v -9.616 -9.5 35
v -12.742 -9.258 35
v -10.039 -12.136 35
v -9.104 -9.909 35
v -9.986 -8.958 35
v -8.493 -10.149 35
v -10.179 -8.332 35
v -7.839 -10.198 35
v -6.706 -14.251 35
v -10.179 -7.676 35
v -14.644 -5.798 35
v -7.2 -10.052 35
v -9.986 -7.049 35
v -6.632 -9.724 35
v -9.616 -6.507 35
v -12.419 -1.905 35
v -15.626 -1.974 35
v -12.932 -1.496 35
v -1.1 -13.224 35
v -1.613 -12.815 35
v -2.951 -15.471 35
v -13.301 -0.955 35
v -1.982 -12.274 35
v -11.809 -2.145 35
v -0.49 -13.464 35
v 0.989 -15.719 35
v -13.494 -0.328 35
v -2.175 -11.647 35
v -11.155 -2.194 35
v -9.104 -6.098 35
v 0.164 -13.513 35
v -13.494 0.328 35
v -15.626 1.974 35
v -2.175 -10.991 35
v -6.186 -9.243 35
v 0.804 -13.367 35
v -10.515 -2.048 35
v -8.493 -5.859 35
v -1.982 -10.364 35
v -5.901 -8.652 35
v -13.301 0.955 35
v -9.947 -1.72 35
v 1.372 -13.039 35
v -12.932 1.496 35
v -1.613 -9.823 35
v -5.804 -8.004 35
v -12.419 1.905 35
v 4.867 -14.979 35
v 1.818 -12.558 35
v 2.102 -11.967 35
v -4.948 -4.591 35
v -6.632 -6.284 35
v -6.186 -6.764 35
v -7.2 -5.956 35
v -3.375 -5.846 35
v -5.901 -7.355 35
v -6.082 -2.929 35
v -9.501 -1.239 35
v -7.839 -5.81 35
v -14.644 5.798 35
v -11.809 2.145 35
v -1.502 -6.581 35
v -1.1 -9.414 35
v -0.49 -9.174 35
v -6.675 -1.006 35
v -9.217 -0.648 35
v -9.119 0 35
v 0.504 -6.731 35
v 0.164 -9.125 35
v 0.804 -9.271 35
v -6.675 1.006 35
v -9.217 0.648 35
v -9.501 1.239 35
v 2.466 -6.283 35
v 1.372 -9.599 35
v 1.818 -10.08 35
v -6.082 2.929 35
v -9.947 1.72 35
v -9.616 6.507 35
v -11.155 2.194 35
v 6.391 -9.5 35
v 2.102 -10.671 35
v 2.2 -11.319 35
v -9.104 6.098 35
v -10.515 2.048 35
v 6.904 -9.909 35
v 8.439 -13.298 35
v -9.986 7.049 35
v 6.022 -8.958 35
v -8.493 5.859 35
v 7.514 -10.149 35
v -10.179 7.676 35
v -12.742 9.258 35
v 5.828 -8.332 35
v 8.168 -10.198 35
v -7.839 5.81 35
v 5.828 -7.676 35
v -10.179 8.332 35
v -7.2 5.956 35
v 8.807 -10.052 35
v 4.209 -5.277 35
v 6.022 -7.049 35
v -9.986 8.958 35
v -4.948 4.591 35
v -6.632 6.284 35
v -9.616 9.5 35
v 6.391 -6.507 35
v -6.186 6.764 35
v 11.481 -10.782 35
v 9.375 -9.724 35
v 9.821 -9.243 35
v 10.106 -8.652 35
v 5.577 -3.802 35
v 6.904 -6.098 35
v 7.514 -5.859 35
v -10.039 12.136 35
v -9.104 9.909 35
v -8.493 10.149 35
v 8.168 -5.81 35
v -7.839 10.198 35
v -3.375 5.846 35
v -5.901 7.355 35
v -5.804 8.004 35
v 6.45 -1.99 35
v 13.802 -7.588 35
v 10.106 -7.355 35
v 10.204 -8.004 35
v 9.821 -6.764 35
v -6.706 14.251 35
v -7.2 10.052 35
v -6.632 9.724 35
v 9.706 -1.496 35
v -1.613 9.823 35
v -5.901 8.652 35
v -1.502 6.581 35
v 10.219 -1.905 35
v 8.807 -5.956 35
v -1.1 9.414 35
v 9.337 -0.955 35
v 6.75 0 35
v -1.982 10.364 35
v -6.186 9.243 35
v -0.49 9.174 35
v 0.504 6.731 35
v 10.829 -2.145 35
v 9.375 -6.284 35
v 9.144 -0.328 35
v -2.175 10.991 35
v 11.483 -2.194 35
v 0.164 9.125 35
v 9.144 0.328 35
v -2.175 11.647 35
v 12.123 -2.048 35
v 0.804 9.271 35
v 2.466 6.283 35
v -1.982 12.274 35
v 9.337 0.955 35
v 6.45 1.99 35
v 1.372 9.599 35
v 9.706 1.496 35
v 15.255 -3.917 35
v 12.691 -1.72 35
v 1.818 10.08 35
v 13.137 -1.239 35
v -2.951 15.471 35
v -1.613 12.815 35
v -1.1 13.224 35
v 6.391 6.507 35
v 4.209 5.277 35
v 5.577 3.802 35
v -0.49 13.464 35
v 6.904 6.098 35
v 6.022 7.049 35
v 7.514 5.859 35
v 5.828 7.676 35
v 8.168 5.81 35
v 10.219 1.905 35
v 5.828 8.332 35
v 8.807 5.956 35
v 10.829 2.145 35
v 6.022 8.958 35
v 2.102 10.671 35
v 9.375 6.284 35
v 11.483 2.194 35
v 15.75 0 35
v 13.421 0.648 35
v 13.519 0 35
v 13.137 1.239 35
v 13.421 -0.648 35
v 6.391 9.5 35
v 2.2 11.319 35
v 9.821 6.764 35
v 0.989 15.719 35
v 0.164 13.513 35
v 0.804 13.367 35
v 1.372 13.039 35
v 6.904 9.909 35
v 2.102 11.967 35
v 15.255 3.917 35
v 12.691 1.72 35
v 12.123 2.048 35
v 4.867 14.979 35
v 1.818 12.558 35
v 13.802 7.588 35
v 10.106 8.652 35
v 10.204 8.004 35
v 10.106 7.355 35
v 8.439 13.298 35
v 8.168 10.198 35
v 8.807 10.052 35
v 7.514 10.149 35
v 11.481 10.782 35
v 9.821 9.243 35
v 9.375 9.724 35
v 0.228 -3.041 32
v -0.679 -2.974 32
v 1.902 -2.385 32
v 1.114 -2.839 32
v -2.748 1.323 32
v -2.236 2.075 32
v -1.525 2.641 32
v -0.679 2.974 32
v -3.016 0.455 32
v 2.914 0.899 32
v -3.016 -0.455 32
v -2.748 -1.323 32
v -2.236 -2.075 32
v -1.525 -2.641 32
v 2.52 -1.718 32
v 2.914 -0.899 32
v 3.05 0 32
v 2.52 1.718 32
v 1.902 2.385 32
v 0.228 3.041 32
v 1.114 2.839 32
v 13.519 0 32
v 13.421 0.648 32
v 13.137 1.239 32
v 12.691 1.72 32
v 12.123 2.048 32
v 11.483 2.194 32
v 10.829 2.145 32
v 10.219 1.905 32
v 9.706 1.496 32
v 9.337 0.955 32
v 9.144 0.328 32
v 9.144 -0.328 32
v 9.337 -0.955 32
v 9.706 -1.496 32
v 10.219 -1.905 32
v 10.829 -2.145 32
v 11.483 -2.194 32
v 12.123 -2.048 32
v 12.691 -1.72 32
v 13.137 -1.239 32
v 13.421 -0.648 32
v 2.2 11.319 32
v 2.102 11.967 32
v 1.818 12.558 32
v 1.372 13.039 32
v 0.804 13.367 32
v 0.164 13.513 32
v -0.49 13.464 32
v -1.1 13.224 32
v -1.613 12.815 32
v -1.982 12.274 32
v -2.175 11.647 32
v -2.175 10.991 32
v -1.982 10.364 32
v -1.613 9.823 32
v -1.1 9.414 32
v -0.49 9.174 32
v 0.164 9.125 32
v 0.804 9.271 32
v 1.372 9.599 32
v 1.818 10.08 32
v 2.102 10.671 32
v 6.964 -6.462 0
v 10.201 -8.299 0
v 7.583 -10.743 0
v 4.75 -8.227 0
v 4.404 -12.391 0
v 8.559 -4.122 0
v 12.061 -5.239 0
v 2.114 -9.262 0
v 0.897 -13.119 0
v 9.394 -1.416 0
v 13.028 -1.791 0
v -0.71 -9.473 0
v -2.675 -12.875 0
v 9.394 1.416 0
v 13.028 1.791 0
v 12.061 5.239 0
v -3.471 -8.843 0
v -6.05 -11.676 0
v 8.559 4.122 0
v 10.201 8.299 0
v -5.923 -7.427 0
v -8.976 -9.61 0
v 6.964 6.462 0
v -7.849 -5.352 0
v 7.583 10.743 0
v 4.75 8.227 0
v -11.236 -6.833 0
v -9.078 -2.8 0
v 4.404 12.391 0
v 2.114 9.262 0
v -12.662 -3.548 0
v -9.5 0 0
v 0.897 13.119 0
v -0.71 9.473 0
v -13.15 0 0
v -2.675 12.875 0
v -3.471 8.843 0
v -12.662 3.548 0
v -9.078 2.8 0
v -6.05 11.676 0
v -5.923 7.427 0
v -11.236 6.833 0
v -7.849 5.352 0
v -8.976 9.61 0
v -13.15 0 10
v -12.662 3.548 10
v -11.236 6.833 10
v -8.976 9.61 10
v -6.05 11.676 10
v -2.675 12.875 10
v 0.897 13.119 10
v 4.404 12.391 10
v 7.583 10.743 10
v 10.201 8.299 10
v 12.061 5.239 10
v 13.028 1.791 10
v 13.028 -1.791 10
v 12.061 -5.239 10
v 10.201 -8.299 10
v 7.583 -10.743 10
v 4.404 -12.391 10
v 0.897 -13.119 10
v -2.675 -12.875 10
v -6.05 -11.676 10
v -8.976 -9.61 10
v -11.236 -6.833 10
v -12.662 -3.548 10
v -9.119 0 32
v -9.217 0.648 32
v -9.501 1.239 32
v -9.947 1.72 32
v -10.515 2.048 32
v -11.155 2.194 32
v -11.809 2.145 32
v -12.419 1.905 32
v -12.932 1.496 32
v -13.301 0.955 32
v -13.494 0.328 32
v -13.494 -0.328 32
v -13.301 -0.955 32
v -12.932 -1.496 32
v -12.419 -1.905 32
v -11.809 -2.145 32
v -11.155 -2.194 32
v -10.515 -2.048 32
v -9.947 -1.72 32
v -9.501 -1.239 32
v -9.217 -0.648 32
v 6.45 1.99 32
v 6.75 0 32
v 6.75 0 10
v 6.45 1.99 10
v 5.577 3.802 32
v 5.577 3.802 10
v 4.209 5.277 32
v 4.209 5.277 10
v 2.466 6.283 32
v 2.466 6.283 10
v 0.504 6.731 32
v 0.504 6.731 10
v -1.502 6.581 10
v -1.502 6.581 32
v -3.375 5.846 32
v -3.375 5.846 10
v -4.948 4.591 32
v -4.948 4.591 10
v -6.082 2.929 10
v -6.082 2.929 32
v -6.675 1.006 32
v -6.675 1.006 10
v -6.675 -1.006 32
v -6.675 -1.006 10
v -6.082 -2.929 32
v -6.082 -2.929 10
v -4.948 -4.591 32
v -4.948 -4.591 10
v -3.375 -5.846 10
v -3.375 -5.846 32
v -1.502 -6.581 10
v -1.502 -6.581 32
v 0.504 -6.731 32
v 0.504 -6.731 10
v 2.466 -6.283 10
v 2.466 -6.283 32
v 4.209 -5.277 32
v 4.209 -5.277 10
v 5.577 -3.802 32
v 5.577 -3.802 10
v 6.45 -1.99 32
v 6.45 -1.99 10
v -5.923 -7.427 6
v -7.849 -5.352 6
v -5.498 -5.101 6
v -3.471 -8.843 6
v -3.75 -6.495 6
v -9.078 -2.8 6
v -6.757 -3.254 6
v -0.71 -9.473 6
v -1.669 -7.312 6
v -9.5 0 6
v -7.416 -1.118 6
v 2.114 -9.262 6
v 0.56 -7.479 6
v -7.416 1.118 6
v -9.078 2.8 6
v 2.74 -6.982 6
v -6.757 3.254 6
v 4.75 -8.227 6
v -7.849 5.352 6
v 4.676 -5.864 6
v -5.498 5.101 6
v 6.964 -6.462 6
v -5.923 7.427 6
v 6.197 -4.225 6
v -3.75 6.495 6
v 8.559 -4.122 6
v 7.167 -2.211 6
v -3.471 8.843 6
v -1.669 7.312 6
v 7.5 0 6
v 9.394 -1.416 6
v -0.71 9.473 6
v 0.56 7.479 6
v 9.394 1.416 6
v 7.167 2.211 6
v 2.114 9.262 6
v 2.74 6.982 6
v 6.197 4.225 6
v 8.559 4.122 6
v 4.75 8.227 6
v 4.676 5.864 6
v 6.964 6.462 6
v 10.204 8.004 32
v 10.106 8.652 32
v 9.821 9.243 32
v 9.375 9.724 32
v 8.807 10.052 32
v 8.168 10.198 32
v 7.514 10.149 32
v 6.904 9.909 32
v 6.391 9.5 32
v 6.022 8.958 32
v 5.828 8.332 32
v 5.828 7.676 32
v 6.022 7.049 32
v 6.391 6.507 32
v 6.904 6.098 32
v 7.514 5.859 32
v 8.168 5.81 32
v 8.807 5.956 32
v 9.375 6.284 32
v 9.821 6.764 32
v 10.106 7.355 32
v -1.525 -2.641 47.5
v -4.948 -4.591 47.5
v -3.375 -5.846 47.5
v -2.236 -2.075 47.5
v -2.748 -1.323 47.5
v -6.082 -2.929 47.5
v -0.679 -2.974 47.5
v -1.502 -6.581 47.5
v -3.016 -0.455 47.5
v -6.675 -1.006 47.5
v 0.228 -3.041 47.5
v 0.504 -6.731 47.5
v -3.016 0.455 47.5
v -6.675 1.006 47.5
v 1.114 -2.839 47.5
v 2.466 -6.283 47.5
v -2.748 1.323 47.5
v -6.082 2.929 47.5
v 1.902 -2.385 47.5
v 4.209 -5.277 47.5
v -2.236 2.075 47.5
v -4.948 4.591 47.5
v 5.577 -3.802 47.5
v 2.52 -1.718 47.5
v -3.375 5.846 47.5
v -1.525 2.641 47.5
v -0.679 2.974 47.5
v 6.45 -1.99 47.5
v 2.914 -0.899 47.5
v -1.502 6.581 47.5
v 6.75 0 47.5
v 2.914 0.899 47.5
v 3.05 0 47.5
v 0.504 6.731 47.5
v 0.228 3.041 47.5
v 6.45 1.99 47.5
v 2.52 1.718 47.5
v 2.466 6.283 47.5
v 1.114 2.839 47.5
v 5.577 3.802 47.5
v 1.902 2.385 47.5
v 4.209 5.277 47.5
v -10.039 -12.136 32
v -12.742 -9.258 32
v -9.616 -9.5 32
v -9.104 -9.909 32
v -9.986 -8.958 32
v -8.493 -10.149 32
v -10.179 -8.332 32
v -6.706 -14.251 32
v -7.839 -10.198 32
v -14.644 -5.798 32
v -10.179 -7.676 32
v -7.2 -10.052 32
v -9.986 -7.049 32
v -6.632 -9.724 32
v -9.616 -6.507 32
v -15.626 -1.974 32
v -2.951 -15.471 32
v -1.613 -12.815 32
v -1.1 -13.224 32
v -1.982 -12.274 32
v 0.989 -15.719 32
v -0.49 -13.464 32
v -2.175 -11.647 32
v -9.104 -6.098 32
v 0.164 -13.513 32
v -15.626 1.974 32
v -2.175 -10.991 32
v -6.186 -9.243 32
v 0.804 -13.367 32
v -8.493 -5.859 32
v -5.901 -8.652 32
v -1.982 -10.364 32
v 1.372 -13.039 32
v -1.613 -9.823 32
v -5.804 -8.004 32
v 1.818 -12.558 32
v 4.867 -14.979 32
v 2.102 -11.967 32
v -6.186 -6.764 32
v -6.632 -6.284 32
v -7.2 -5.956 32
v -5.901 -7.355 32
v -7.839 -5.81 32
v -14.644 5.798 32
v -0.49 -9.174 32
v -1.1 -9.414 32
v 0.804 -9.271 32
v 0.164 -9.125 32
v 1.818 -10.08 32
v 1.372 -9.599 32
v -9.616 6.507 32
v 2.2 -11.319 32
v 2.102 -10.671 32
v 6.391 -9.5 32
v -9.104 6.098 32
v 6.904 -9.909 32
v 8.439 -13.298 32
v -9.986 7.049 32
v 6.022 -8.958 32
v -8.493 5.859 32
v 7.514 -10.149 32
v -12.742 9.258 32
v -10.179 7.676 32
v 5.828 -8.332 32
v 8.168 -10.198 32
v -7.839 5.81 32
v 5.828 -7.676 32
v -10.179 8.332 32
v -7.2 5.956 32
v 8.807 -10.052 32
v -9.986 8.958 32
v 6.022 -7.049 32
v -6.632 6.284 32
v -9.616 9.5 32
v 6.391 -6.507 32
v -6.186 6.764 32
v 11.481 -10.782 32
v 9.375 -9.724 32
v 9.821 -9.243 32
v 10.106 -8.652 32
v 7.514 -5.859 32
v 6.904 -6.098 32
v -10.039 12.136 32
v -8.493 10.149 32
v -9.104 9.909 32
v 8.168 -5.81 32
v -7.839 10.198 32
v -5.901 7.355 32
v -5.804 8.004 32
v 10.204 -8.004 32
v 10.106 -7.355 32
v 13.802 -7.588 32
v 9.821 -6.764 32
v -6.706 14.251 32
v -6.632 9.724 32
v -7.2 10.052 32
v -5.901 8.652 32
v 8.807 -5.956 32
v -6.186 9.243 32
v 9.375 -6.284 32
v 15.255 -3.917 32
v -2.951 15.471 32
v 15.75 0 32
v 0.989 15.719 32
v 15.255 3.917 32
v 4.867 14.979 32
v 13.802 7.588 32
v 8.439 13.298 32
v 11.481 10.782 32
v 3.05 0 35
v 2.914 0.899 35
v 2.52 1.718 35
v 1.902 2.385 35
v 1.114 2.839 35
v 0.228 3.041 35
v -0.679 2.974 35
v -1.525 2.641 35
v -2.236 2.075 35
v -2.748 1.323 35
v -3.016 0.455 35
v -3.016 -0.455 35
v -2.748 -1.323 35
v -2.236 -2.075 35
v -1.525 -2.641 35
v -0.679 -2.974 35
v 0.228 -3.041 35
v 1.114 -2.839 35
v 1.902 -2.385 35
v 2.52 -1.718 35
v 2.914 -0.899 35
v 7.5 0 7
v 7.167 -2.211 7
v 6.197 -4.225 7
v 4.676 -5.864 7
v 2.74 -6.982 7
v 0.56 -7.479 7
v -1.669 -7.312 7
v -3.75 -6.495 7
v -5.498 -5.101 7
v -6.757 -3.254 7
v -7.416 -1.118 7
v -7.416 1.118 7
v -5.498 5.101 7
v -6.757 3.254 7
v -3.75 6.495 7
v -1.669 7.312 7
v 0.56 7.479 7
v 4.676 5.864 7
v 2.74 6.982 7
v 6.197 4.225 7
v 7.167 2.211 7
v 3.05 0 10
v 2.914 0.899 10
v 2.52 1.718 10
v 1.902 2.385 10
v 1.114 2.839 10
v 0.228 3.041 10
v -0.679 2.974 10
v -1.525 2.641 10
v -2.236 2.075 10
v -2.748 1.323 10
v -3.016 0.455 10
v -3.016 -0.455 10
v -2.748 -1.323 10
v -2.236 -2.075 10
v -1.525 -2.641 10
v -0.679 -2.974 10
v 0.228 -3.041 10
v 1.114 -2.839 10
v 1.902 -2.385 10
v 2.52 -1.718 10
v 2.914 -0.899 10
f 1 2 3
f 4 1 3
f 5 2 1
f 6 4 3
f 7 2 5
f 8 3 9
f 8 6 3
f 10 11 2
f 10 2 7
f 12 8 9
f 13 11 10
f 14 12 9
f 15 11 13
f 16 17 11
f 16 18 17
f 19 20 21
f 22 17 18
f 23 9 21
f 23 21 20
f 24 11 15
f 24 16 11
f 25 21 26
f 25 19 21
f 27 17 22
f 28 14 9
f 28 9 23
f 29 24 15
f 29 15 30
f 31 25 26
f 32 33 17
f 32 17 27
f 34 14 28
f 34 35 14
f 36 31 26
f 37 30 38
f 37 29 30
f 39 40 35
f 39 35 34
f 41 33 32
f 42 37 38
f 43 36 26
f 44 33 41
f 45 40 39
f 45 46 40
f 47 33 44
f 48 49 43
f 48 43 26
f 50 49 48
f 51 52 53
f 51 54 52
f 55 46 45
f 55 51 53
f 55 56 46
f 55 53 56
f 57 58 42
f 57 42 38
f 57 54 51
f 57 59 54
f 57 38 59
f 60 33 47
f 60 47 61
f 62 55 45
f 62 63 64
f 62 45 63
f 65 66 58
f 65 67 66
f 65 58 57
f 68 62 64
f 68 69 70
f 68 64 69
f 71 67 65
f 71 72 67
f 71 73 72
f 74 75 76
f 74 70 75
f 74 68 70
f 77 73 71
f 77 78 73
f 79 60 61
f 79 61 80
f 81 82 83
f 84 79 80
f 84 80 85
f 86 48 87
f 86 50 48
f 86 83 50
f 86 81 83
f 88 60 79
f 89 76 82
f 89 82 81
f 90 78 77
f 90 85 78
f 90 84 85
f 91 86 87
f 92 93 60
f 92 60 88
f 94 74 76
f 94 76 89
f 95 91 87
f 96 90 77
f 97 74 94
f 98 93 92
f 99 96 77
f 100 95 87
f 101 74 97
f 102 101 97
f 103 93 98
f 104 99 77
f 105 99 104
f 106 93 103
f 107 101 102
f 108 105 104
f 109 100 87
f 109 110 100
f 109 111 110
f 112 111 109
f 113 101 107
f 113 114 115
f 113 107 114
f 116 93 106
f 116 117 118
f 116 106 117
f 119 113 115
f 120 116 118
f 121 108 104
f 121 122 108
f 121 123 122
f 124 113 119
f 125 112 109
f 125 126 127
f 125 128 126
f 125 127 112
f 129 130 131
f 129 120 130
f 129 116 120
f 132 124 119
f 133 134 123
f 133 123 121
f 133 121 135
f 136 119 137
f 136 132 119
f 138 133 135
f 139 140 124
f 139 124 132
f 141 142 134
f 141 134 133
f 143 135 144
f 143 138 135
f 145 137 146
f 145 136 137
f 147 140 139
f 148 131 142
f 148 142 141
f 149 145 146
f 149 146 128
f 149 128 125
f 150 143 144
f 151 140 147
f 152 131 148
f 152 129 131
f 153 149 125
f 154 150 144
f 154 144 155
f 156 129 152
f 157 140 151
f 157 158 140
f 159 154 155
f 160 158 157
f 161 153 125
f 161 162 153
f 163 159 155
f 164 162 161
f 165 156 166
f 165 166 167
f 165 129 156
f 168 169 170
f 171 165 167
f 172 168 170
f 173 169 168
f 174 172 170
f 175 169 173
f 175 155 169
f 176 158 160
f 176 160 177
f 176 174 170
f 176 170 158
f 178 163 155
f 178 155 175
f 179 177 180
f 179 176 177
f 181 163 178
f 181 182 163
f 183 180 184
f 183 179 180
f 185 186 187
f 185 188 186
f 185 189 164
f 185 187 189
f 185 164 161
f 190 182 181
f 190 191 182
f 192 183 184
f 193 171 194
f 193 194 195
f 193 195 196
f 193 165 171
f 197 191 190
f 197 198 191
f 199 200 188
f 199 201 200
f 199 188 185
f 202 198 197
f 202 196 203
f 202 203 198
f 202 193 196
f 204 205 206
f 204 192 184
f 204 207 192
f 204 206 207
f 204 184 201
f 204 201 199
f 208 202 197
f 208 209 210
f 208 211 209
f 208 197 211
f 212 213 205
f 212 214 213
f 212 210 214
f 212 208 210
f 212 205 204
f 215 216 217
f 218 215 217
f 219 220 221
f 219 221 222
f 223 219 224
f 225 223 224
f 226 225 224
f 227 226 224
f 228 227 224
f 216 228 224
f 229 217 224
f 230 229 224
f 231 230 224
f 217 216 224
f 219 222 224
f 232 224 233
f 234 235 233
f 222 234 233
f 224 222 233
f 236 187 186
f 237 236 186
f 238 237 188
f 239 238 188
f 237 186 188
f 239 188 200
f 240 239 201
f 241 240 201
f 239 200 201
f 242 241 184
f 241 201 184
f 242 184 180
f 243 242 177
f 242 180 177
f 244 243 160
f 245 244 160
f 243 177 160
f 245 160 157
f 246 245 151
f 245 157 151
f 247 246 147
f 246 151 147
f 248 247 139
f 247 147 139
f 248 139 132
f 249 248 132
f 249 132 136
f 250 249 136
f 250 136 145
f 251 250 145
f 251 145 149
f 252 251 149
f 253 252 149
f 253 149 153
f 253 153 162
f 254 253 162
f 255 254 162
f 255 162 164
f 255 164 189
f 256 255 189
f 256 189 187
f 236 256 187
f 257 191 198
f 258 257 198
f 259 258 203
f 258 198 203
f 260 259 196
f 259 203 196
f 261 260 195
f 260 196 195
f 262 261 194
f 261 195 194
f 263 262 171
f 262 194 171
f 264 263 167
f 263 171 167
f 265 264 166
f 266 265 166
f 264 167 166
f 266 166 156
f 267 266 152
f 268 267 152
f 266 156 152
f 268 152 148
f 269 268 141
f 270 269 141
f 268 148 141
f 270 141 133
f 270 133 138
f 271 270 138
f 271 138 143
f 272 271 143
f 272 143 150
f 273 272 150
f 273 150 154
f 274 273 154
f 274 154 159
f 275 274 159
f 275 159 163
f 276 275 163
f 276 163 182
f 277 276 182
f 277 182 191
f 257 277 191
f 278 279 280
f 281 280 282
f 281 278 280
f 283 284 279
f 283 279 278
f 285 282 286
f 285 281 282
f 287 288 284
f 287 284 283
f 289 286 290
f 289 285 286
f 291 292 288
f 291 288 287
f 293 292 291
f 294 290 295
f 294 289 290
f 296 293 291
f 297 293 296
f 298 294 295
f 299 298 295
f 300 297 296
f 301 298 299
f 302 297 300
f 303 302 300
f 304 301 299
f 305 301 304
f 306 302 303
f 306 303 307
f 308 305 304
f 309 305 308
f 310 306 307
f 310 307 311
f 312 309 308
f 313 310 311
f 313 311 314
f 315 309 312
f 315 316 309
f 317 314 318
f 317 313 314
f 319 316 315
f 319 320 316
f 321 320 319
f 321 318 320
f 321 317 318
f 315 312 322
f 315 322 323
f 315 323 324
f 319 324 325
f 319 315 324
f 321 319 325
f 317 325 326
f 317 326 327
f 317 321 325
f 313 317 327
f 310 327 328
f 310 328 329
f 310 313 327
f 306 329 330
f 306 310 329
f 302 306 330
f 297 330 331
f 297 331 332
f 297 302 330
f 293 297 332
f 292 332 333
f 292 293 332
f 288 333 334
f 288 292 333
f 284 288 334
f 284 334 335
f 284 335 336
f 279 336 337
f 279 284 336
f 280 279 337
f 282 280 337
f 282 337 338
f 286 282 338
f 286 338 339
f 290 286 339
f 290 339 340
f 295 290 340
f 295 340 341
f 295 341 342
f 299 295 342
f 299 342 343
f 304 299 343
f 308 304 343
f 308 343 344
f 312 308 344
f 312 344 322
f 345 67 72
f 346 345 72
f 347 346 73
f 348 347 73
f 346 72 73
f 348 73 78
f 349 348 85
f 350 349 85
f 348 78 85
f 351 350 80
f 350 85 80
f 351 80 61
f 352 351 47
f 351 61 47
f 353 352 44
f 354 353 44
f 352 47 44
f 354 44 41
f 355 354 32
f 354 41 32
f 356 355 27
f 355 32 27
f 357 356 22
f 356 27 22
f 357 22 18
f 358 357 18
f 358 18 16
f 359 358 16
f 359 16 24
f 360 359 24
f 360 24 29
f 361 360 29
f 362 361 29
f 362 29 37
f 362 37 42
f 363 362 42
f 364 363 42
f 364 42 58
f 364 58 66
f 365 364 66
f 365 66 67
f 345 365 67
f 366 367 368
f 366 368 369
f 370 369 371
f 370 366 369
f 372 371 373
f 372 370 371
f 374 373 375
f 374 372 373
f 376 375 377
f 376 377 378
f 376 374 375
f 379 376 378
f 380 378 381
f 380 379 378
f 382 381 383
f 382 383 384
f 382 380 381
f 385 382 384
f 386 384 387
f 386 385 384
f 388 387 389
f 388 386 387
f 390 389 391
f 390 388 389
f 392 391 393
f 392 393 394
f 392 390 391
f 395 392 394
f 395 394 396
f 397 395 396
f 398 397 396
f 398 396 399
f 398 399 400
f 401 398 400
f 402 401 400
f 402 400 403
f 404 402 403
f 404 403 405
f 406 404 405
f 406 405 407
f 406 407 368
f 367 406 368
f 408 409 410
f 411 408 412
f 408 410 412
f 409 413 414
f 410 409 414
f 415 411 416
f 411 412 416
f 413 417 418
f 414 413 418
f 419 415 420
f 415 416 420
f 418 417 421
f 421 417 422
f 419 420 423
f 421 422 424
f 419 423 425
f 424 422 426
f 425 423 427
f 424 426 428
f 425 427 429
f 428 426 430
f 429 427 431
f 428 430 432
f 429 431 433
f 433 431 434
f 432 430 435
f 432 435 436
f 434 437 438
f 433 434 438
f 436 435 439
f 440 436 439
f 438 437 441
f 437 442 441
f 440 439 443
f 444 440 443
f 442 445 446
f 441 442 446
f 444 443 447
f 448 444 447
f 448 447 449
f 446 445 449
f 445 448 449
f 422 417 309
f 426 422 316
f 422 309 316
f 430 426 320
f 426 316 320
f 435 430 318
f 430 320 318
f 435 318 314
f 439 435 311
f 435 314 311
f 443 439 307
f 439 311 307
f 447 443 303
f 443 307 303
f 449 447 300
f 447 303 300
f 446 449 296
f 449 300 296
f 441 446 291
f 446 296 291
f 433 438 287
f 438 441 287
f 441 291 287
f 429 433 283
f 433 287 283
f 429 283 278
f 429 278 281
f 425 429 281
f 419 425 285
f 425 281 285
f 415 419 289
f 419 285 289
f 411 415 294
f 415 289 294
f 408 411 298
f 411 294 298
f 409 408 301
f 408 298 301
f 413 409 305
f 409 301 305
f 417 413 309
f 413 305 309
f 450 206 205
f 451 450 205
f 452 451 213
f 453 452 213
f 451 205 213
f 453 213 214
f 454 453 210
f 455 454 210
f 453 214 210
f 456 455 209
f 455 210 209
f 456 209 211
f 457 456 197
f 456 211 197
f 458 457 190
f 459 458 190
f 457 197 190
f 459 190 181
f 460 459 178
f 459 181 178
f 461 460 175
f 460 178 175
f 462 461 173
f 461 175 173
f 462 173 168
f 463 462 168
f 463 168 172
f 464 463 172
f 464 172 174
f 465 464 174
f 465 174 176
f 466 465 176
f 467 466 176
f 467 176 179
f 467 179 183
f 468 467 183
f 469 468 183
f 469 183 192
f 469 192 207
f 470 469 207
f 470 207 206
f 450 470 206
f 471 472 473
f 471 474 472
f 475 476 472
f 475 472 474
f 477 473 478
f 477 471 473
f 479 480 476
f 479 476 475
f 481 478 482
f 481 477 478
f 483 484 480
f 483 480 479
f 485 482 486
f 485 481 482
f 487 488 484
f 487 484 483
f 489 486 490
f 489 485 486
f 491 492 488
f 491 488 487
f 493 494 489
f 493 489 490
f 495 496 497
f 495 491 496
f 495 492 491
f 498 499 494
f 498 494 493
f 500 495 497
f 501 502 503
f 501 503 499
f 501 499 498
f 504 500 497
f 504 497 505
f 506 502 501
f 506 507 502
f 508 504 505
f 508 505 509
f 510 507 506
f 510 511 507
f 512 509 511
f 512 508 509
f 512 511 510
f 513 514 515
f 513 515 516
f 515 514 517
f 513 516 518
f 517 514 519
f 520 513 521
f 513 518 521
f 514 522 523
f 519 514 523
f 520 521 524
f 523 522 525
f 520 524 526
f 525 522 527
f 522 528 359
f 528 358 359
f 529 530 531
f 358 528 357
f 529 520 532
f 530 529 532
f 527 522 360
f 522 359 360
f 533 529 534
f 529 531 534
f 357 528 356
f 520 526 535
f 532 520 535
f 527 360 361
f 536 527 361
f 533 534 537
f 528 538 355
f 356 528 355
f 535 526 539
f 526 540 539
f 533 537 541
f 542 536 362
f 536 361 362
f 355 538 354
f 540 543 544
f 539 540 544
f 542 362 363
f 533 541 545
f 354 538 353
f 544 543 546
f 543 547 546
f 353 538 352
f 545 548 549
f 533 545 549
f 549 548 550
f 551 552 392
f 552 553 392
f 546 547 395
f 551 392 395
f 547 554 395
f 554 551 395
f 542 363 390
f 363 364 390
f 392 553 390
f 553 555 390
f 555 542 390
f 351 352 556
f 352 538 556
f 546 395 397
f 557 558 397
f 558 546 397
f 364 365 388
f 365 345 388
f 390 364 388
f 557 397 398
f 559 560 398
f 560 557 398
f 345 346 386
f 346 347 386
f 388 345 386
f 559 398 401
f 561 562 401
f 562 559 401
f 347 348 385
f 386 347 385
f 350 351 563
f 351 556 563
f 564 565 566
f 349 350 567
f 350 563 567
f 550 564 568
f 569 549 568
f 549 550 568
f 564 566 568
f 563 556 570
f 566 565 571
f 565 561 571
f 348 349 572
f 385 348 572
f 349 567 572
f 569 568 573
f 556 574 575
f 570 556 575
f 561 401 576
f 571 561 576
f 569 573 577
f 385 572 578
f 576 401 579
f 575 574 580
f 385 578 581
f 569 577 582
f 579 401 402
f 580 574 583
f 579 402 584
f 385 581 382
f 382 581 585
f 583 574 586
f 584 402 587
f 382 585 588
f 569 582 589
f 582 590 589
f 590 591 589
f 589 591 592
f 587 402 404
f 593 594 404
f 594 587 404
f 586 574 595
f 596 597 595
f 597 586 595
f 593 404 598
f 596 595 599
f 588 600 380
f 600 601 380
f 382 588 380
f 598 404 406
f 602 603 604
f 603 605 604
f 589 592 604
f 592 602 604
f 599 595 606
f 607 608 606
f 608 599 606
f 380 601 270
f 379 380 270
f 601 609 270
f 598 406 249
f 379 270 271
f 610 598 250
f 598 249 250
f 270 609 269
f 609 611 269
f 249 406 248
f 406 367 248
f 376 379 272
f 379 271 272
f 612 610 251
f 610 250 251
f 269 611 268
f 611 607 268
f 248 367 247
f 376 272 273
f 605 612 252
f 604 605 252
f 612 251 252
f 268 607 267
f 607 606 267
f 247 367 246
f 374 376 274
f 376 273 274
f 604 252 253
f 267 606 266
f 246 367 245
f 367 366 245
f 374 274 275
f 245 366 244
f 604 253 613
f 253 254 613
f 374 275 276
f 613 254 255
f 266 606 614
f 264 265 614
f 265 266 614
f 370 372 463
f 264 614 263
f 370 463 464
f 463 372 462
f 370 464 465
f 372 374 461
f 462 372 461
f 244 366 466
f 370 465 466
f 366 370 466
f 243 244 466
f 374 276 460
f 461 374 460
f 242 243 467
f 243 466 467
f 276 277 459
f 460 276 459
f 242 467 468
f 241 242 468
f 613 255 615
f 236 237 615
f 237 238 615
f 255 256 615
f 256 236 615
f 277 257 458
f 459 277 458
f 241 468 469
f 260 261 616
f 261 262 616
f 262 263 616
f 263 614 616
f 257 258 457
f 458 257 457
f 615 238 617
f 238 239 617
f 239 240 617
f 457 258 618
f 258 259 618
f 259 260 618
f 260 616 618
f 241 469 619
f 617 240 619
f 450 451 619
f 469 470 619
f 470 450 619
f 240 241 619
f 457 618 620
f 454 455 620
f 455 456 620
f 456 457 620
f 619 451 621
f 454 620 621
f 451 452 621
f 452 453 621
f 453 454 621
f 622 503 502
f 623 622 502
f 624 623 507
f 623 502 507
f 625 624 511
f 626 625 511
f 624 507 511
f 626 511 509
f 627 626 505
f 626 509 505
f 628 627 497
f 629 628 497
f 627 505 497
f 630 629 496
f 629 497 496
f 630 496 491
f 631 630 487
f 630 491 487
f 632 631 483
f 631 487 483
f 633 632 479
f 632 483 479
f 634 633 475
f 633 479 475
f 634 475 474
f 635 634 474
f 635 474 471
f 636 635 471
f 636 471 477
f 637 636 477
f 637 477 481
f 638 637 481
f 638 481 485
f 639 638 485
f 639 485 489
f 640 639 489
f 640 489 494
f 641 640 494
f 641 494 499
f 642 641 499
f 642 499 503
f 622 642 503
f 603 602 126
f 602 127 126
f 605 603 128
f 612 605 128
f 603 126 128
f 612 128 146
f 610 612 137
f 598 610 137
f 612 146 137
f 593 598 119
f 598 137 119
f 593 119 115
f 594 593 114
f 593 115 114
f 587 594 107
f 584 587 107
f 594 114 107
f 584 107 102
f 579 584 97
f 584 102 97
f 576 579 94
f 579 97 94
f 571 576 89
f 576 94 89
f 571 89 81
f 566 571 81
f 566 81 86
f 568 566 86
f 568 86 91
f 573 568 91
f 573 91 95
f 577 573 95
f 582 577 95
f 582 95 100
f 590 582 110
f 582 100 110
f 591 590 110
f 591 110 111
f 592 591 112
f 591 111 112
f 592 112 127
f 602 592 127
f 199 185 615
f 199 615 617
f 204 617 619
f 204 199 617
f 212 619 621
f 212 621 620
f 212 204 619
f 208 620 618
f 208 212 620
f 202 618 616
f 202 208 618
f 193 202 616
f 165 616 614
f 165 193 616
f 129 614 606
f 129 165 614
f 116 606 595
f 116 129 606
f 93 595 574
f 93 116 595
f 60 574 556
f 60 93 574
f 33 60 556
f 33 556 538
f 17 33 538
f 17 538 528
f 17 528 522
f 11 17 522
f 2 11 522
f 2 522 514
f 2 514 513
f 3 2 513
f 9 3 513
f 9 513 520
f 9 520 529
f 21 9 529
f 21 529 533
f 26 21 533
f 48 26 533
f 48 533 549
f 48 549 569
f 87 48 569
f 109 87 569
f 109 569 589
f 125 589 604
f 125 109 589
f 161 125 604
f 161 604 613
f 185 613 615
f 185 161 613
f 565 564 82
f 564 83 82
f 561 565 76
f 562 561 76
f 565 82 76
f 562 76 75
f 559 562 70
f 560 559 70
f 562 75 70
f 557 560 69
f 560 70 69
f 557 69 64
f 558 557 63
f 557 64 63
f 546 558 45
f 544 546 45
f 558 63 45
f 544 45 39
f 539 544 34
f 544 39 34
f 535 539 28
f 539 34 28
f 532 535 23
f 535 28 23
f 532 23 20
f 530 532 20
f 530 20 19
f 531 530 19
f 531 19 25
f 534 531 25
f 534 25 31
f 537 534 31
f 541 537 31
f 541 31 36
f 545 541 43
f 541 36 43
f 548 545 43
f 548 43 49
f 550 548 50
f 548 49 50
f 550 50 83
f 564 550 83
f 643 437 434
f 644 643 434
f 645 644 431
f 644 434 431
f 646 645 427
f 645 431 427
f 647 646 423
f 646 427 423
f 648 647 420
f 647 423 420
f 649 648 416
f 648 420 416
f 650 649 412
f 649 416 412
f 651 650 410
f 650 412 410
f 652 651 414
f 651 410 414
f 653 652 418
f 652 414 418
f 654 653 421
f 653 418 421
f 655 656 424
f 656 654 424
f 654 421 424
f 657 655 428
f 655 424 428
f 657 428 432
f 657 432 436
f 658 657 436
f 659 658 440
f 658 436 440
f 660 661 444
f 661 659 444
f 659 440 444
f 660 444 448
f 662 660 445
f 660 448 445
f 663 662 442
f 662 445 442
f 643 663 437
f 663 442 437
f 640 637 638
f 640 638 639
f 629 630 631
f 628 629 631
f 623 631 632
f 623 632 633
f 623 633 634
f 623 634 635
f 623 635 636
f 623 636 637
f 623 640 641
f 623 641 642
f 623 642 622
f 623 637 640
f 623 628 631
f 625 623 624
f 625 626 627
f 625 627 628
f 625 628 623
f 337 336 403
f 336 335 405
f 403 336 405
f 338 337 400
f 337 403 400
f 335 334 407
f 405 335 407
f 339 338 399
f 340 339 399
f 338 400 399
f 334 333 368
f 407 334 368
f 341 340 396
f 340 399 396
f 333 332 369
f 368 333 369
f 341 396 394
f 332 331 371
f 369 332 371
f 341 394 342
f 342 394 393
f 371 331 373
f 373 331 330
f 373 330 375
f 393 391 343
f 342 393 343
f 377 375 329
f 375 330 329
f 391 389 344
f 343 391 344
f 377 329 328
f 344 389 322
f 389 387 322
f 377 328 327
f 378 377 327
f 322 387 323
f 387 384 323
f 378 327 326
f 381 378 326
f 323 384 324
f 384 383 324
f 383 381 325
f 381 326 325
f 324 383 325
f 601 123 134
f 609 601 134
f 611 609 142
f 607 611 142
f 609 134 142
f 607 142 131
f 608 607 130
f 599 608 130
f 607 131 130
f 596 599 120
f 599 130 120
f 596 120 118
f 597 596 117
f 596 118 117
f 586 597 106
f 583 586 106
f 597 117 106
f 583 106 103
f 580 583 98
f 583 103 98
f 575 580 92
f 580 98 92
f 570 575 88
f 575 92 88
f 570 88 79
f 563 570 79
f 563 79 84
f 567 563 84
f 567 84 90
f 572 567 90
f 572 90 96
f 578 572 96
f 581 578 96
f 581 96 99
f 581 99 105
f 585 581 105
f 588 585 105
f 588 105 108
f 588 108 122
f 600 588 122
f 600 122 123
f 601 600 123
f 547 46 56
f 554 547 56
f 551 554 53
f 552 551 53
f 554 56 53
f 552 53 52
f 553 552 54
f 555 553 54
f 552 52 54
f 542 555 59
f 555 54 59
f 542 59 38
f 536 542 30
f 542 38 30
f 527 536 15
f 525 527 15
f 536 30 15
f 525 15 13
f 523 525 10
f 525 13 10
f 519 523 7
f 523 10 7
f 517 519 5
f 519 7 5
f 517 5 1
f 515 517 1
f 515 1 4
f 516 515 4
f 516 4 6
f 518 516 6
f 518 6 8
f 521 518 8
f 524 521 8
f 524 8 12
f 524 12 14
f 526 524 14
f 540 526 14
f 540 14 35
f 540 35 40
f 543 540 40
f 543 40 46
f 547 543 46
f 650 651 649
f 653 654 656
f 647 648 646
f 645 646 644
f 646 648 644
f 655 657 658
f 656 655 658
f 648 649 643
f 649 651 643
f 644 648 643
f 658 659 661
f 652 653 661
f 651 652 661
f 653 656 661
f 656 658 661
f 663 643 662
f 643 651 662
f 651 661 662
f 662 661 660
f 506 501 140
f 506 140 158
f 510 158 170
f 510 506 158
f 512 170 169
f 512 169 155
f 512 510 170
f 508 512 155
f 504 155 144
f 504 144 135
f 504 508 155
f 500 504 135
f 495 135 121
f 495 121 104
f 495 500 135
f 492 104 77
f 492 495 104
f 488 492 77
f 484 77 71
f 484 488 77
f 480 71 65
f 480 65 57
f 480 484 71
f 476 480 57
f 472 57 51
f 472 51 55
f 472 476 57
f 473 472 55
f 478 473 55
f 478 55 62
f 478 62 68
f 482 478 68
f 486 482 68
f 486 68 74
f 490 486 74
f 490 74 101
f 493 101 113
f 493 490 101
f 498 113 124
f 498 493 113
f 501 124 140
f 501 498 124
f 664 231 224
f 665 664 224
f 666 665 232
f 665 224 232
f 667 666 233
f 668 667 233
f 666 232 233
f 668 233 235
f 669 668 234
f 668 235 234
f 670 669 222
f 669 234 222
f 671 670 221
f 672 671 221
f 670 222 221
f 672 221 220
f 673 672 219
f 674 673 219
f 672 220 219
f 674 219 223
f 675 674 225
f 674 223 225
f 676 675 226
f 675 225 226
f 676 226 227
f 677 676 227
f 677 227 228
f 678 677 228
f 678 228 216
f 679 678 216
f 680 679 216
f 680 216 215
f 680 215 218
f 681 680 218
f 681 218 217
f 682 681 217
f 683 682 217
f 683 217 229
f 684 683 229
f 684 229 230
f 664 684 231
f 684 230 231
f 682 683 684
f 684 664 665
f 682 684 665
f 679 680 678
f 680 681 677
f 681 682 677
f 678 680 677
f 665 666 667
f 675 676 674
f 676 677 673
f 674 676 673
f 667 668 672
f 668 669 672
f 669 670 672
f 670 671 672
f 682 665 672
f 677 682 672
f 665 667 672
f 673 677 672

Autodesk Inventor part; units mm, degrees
ref_plane "YZ Plane" through (0, 0, 0) normal (1, 0, 0) x (0, 1, 0)
sketch "Эскиз1" plane through (0, 0, 0) normal (0, 0, 1) x (1, 0, 0)
  circle A0 centre (0, 0) radius 6.75
  circle A1 centre (0, 0) radius 3.05
  dimension "d0" = 13.5
  dimension "d1" = 6.1
ref_plane "РабПлоскость1" through (0, 0, 35) normal (0, 0, 1) x (1, 0, 0)
sketch "Эскиз2" plane through (0, 0, 35) normal (0, 0, 1) x (1, 0, 0)
  circle A0 centre (0, 0) radius 15.75
  dimension "d5" = 31.5
extrude "Выдавливание2" add sketch "Эскиз2" against normal blind 3
sketch "Эскиз3" plane through (0, 0, 35) normal (0, 0, 1) x (1, 0, 0)
  line L0 (0, 0) -> (0, 11.319)
  line L1 (0, 0) -> (11.319, 0) construction
  circle A0 centre (0, 11.319) radius 2.2
  circle A1 centre (0, 0) radius 1.4142
  circle A2 centre (-8.0037, 8.0037) radius 2.2
  circle A3 centre (-11.319, 0) radius 2.2
  circle A4 centre (-8.0037, -8.0037) radius 2.2
  circle A5 centre (0, -11.319) radius 2.2
  circle A6 centre (8.0037, -8.0037) radius 2.2
  circle A7 centre (11.319, 0) radius 2.2
  circle A8 centre (8.0037, 8.0037) radius 2.2
  dimension "d8" = 11.319
  dimension "d9" = 90
  dimension "d10" = 4.4
  dimension "d13" = 360
extrude "Выдавливание3" cut sketch "Эскиз3" against normal blind 3 contours A0 | A2 | A3 | A4 | A5 | A6 | A7 | A8
ref_plane "РабПлоскость4" through (0, 0, 0) normal (0, 0, -1) x (-1, 0, 0)
sketch "Эскиз4" plane through (0, 0, 0) normal (0, 0, -1) x (-1, 0, 0)
  circle A0 centre (0, 0) radius 13.15
  circle A1 centre (0, 0) radius 9.5
  dimension "d17" = 26.3
  dimension "d18" = 19
extrude "Выдавливание4" add sketch "Эскиз4" against normal blind 10
ref_plane "РабПлоскость2" through (0, 0, 7) normal (0, 0, 1) x (1, 0, 0)
ref_plane "РабПлоскость3" through (0, 0, 47.5) normal (0, 0, 1) x (1, 0, 0)
sketch "Эскиз6" plane through (0, 0, 47.5) normal (0, 0, 1) x (1, 0, 0)
  circle A0 centre (0, 0) radius 6.75
  circle A1 centre (0, 0) radius 3.05
  dimension "d28" = 13.5
  dimension "d29" = 6.1
ref_plane "РабПлоскость5" through (0, 0, 6) normal (0, 0, 1) x (1, 0, 0)
sketch "Эскиз7" plane through (0, 0, 6) normal (0, 0, 1) x (1, 0, 0)
  circle A0 centre (0, 0) radius 7.5
  circle A1 centre (0, 0) radius 9.5
  dimension "d31" = 15
  dimension "d32" = 19
extrude "Выдавливание7" add sketch "Эскиз7" along normal blind 4 contours A0 | A1
extrude "Выдавливание8" cut sketch "Эскиз7" along normal blind 1 contours A0
extrude "Выдавливание9" add sketch "Эскиз6" against normal blind 38.5
properties part number "Затычка для Косозубки"
